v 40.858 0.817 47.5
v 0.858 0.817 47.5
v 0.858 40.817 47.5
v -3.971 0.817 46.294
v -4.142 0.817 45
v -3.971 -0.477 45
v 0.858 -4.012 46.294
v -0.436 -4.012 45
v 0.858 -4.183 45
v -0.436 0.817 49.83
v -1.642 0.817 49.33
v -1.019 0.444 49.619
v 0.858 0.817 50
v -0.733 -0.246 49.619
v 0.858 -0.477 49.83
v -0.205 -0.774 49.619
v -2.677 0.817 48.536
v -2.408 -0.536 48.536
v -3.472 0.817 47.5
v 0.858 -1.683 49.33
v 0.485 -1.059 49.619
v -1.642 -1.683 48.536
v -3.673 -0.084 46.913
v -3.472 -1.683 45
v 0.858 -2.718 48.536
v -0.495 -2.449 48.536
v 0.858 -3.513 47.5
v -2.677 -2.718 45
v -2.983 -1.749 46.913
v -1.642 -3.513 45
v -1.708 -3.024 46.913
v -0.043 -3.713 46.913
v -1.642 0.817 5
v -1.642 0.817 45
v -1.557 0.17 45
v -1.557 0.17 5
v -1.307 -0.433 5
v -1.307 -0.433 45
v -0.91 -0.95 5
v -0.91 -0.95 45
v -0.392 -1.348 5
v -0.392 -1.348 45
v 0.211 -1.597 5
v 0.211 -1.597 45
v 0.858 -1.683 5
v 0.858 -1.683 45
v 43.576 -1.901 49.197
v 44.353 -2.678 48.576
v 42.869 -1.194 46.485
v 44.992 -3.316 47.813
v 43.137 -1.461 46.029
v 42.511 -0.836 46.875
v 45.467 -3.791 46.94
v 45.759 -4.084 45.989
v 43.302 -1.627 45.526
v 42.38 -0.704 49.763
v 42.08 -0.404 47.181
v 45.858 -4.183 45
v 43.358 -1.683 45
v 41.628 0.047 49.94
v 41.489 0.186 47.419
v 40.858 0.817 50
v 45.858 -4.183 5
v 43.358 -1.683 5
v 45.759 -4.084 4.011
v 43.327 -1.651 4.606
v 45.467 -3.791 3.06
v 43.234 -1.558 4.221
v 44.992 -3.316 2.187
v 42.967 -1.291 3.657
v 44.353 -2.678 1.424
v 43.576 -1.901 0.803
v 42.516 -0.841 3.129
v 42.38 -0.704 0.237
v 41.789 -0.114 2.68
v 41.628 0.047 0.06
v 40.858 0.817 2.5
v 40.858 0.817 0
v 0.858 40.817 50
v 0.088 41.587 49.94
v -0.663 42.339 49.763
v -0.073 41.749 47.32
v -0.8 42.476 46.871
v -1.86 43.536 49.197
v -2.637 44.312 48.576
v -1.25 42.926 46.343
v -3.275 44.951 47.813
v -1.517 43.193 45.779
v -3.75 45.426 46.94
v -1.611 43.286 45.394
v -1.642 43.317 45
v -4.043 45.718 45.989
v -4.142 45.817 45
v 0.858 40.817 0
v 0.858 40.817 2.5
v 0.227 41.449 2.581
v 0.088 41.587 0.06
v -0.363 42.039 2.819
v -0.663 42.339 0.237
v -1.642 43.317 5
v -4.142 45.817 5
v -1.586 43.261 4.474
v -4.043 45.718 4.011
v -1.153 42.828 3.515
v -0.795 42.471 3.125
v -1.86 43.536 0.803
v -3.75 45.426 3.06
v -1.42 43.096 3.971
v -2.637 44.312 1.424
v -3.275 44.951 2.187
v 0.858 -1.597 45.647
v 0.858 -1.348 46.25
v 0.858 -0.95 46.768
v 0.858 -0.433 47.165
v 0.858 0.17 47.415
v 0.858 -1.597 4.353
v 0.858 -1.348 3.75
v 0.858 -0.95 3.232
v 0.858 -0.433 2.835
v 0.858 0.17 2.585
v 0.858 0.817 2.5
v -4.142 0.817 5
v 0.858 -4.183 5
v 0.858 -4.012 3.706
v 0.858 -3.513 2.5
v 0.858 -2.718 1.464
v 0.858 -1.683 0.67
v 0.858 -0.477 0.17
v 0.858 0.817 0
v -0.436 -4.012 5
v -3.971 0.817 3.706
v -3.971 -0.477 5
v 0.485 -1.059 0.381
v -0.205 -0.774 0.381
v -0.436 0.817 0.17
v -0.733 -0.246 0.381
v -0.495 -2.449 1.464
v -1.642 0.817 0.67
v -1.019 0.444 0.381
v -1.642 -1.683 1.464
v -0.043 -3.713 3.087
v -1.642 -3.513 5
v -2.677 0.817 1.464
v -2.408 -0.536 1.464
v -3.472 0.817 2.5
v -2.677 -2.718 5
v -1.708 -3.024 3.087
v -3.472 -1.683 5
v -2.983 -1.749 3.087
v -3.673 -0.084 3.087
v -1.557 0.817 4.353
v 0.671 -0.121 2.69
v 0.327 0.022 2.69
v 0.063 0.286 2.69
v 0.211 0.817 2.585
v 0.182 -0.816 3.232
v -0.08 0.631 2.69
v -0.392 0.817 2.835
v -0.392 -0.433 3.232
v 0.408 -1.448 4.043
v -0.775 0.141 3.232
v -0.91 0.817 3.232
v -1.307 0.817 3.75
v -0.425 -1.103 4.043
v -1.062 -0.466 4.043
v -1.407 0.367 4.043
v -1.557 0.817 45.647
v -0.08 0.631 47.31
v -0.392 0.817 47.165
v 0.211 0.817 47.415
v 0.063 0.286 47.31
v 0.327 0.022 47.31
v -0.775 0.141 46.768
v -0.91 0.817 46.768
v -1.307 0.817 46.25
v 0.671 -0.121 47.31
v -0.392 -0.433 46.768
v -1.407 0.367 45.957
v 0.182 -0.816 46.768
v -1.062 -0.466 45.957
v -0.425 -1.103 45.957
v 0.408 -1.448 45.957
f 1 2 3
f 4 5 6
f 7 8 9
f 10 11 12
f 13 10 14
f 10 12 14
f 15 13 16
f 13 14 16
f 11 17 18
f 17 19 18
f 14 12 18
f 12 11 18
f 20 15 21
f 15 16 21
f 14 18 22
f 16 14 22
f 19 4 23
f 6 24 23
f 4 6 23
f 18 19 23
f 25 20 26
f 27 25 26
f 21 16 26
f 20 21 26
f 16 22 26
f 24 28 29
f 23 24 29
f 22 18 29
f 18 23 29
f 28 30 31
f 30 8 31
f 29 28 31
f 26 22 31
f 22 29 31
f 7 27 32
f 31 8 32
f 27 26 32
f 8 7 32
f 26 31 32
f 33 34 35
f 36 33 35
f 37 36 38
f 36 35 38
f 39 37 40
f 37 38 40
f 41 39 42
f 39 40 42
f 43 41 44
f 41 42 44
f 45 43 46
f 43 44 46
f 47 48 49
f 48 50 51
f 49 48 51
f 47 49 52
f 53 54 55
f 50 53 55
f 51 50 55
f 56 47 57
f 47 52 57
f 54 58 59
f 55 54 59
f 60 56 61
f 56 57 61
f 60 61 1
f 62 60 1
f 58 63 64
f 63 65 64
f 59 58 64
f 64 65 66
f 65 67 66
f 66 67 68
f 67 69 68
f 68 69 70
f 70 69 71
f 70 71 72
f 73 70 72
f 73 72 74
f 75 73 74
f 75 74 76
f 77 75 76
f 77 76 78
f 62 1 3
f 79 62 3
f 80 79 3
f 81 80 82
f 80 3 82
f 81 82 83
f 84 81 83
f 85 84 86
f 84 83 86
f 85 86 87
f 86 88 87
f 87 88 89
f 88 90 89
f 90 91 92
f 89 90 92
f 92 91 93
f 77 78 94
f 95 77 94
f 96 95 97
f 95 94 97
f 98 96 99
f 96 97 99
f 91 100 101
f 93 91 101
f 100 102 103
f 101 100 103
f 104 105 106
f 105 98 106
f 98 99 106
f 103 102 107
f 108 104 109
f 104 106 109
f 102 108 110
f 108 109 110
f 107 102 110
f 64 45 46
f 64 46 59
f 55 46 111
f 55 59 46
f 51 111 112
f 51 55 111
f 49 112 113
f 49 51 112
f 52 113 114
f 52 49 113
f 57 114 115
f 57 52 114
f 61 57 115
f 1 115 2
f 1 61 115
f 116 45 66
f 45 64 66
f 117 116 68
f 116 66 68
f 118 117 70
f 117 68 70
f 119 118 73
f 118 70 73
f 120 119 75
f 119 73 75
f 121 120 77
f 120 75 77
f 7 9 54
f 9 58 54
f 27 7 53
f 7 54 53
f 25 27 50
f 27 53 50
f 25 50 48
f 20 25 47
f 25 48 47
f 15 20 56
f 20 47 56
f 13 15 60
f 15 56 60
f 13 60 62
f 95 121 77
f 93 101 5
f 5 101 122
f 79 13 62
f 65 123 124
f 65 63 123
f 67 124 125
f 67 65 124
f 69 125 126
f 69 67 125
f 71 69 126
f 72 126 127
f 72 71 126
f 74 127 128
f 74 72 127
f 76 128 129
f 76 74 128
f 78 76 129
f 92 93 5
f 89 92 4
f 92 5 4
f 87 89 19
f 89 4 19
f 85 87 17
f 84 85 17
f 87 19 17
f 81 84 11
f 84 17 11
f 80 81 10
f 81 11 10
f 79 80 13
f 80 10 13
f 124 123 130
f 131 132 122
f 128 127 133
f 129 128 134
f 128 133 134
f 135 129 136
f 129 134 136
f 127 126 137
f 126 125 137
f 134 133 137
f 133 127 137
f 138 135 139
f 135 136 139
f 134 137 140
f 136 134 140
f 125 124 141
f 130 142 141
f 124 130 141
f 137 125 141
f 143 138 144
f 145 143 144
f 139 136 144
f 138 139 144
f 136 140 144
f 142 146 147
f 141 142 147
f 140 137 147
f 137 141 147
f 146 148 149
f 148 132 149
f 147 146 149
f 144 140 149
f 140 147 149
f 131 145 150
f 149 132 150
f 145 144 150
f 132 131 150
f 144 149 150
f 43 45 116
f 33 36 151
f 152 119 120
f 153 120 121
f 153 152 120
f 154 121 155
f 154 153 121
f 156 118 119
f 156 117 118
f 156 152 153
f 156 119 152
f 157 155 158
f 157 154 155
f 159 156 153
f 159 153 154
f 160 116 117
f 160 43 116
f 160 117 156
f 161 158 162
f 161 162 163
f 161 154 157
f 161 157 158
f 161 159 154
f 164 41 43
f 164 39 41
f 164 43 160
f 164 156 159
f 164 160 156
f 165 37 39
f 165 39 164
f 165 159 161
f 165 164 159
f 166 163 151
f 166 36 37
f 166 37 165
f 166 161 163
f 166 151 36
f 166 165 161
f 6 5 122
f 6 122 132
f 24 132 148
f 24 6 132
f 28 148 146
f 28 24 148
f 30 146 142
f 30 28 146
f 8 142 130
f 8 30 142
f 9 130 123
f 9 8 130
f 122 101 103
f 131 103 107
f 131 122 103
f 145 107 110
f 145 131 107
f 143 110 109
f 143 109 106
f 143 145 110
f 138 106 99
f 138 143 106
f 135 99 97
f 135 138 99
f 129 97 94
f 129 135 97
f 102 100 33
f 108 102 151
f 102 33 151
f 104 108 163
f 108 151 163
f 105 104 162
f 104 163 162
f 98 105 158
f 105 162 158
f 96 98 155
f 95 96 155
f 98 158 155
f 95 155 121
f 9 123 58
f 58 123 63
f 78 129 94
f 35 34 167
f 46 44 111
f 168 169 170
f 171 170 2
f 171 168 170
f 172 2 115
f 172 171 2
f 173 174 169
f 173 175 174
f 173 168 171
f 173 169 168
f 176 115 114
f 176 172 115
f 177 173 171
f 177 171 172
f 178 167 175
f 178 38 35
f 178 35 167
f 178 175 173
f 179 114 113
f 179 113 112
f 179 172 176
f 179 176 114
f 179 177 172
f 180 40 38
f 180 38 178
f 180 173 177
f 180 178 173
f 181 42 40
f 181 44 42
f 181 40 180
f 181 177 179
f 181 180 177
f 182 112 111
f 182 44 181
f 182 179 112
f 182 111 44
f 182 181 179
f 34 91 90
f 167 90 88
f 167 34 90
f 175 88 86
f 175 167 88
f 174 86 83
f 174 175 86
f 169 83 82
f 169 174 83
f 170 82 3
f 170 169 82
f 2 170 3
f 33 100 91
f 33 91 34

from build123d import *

# Parameters (mm, degrees)
F1_DEPTH = 50
F2_R     = 5
F3_T     = -2.5


with BuildPart() as f1:
    # F0 (on Top) → F1 (new body)
    with BuildSketch(Plane.XY):
        Polygon((-4.141866, 45.817343), (-4.141866, -4.182657), (45.858134, -4.182657), align=None)
    extrude(amount=F1_DEPTH)

    # F2
    f2_edges = [f1.edges().sort_by_distance(p)[0] for p in [
        (-4.141866, -4.182657, 25),
        (20.858134, -4.182657, 0),
        (-4.141866, 20.817343, 0),
        (-4.141866, 20.817343, 50),
        (20.858134, -4.182657, 50),
    ]]
    fillet(f2_edges, radius=F2_R)

    # F3
    f3_openings = [f1.faces().sort_by_distance(p)[0] for p in [
        (20.858134, 20.817343, 25),
    ]]
    offset(amount=F3_T, openings=f3_openings)


solid = f1.part
